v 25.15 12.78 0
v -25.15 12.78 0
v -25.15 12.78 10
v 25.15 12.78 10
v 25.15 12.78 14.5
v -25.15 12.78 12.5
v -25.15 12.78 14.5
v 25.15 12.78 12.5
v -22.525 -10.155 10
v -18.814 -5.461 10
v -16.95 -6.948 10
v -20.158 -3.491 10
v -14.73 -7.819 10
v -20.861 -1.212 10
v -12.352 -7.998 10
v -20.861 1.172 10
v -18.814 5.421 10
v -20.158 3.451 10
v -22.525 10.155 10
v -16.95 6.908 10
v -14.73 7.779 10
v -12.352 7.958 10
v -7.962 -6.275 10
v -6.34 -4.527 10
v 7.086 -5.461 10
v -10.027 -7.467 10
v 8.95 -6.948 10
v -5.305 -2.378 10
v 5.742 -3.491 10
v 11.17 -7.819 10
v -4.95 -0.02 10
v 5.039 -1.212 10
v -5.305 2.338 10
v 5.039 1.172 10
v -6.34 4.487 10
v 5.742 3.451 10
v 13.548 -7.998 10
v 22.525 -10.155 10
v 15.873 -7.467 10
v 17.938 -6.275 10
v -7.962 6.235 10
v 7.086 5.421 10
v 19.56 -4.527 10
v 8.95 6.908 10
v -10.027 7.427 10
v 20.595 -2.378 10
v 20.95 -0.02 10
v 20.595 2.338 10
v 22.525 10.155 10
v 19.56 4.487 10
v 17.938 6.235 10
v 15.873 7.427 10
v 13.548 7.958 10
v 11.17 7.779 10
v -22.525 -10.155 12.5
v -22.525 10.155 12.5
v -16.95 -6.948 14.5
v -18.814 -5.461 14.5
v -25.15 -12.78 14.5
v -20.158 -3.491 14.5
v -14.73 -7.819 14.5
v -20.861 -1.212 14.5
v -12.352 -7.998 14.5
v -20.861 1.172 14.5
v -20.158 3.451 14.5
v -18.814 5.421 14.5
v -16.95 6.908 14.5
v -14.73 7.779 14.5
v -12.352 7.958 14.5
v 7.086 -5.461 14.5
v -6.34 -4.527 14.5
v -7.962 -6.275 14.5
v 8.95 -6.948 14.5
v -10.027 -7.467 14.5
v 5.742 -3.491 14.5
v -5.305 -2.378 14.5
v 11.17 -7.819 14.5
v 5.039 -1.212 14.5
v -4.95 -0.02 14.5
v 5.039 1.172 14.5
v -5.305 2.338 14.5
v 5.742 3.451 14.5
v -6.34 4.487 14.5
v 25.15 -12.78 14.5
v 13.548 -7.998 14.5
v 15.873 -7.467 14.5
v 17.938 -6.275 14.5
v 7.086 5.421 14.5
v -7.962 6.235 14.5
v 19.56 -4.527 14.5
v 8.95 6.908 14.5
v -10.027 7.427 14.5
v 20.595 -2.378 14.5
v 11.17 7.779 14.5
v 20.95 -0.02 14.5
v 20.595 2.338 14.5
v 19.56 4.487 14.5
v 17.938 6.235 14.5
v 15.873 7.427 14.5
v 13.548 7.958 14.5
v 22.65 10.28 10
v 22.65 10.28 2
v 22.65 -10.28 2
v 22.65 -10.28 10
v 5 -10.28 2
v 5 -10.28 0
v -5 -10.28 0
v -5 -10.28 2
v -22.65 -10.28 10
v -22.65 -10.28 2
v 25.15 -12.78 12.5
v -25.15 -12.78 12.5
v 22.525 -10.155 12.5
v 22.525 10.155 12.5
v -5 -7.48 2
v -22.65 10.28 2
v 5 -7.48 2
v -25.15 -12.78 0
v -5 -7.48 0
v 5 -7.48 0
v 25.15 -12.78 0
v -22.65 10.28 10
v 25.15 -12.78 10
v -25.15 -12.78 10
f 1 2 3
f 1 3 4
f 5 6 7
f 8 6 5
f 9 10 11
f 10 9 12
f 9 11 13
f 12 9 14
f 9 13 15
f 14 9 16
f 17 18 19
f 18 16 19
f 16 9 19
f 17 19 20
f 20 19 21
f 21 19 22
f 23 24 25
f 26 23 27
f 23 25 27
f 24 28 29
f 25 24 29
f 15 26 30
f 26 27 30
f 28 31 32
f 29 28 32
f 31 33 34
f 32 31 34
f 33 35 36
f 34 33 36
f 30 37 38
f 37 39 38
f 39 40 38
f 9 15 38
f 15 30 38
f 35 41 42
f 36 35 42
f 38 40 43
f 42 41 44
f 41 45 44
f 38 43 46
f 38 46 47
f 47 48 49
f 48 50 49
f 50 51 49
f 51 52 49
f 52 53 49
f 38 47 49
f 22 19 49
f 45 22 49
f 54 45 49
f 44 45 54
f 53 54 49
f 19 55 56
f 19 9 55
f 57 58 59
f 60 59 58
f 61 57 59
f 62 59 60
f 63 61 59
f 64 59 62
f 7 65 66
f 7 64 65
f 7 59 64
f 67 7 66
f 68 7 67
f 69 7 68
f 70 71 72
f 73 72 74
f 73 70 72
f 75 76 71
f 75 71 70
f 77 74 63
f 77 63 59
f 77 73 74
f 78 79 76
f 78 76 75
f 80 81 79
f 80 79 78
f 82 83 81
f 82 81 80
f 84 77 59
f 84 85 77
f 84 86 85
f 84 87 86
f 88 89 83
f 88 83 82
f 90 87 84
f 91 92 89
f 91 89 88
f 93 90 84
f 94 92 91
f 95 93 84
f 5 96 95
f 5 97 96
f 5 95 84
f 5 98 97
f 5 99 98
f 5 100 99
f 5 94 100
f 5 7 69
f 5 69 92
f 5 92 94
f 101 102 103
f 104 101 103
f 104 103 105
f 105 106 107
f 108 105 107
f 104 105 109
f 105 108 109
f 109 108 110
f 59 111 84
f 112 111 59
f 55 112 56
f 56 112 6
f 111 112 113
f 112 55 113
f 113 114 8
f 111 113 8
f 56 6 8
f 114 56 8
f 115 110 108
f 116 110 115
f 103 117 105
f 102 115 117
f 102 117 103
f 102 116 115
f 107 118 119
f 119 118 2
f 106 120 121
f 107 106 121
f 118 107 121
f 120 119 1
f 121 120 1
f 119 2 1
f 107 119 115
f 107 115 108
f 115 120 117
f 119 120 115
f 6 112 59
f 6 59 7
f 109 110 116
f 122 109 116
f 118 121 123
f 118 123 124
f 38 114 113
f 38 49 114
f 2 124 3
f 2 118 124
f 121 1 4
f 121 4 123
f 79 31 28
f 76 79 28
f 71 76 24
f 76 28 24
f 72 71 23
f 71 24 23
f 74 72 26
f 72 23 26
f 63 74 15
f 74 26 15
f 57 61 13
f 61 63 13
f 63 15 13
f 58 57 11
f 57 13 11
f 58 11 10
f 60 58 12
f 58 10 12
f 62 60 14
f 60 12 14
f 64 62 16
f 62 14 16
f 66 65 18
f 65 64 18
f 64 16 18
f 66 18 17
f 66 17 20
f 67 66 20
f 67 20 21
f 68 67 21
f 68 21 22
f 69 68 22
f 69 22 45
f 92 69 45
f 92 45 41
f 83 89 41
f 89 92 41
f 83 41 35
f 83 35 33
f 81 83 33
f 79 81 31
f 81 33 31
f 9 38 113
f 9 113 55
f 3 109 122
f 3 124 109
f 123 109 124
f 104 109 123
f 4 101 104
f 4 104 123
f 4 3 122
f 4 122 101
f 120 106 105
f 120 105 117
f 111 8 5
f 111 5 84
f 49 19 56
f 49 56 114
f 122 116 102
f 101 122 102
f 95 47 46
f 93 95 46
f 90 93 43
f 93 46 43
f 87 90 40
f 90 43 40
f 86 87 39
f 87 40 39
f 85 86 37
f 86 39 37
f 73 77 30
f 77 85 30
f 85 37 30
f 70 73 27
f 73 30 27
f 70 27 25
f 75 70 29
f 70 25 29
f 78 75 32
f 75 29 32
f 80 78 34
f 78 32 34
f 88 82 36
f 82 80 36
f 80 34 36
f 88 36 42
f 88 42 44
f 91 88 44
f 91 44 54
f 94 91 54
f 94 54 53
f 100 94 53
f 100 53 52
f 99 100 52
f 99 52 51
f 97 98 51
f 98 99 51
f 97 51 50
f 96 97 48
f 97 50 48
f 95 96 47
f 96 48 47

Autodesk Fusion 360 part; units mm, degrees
sketch "top" plane through (0, 0, 0) normal (0, 0, 1) x (1, 0, 0)
  line L0 (22.65, -10.28) -> (-22.65, -10.28)
  line L1 (-22.65, -10.28) -> (-22.65, 10.28)
  line L2 (-22.65, 10.28) -> (22.65, 10.28)
  line L3 (22.65, 10.28) -> (22.65, -10.28)
  line L4 (22.65, -10.28) -> (-22.65, 10.28) construction
  line L5 (-22.65, -10.28) -> (22.65, 10.28) construction
  circle A0 centre (12.95, -0.02) radius 8
  circle A1 centre (-12.95, -0.02) radius 8
  line L6 (-4.95, 0) -> (4.95, 0) construction
  line L7 (-5, -10.28) -> (5, -10.28)
  line L8 (5, -10.28) -> (5, -7.48)
  line L9 (5, -7.48) -> (-5, -7.48)
  line L10 (-5, -7.48) -> (-5, -10.28)
  line L11 (0, -7.48) -> (0, -10.28) construction
  line L12 (25.15, -12.78) -> (-25.15, -12.78)
  line L13 (-25.15, -12.78) -> (-25.15, 12.78)
  line L14 (-25.15, 12.78) -> (25.15, 12.78)
  line L15 (25.15, 12.78) -> (25.15, -12.78)
  line L16 (22.525, -10.155) -> (-22.525, -10.155)
  line L17 (-22.525, -10.155) -> (-22.525, 10.155)
  line L18 (-22.525, 10.155) -> (22.525, 10.155)
  line L19 (22.525, 10.155) -> (22.525, -10.155)
  dimension "d1" = 45.3
  dimension "d2" = 20.56
  dimension "d3" = 16
  dimension "d4" = 16
  dimension "d5" = 2.3
  dimension "d6" = 1.7
  dimension "d7" = 1.7
  dimension "d8" = 2.3
  dimension "d9" = 2.8
  dimension "d10" = 10
  dimension "d11" = -2.5
  dimension "d20" = 0.125
extrude "Extrude1" add sketch "top" along normal blind 2 contours L0 L1 L2 L3 L8 L10 L16 L17 L18 L19 | L8 L9 L10 L16 L17 L18 L19 | A0 | A1 | L12 L13 L14 L15 makes body 1
extrude "Extrude2" add sketch "top" along normal blind 8 from surface at 2 contours L12 L13 L14 L15 bodies 1
extrude "Extrude4" add sketch "top" along normal blind 2.5 from surface at 10 separate body contours L8 L9 L10 L16 | L8 L9 L10 L16 L17 L18 L19 makes body 2
extrude "Extrude5" add sketch "top" along normal blind 2 from surface at 12.5 contours L0 L1 L2 L3 L8 L10 L16 L17 L18 L19 | L0 L7 L8 L10 L16 | L8 L9 L10 L16 | L8 L9 L10 L16 L17 L18 L19 | L12 L13 L14 L15 bodies 2
